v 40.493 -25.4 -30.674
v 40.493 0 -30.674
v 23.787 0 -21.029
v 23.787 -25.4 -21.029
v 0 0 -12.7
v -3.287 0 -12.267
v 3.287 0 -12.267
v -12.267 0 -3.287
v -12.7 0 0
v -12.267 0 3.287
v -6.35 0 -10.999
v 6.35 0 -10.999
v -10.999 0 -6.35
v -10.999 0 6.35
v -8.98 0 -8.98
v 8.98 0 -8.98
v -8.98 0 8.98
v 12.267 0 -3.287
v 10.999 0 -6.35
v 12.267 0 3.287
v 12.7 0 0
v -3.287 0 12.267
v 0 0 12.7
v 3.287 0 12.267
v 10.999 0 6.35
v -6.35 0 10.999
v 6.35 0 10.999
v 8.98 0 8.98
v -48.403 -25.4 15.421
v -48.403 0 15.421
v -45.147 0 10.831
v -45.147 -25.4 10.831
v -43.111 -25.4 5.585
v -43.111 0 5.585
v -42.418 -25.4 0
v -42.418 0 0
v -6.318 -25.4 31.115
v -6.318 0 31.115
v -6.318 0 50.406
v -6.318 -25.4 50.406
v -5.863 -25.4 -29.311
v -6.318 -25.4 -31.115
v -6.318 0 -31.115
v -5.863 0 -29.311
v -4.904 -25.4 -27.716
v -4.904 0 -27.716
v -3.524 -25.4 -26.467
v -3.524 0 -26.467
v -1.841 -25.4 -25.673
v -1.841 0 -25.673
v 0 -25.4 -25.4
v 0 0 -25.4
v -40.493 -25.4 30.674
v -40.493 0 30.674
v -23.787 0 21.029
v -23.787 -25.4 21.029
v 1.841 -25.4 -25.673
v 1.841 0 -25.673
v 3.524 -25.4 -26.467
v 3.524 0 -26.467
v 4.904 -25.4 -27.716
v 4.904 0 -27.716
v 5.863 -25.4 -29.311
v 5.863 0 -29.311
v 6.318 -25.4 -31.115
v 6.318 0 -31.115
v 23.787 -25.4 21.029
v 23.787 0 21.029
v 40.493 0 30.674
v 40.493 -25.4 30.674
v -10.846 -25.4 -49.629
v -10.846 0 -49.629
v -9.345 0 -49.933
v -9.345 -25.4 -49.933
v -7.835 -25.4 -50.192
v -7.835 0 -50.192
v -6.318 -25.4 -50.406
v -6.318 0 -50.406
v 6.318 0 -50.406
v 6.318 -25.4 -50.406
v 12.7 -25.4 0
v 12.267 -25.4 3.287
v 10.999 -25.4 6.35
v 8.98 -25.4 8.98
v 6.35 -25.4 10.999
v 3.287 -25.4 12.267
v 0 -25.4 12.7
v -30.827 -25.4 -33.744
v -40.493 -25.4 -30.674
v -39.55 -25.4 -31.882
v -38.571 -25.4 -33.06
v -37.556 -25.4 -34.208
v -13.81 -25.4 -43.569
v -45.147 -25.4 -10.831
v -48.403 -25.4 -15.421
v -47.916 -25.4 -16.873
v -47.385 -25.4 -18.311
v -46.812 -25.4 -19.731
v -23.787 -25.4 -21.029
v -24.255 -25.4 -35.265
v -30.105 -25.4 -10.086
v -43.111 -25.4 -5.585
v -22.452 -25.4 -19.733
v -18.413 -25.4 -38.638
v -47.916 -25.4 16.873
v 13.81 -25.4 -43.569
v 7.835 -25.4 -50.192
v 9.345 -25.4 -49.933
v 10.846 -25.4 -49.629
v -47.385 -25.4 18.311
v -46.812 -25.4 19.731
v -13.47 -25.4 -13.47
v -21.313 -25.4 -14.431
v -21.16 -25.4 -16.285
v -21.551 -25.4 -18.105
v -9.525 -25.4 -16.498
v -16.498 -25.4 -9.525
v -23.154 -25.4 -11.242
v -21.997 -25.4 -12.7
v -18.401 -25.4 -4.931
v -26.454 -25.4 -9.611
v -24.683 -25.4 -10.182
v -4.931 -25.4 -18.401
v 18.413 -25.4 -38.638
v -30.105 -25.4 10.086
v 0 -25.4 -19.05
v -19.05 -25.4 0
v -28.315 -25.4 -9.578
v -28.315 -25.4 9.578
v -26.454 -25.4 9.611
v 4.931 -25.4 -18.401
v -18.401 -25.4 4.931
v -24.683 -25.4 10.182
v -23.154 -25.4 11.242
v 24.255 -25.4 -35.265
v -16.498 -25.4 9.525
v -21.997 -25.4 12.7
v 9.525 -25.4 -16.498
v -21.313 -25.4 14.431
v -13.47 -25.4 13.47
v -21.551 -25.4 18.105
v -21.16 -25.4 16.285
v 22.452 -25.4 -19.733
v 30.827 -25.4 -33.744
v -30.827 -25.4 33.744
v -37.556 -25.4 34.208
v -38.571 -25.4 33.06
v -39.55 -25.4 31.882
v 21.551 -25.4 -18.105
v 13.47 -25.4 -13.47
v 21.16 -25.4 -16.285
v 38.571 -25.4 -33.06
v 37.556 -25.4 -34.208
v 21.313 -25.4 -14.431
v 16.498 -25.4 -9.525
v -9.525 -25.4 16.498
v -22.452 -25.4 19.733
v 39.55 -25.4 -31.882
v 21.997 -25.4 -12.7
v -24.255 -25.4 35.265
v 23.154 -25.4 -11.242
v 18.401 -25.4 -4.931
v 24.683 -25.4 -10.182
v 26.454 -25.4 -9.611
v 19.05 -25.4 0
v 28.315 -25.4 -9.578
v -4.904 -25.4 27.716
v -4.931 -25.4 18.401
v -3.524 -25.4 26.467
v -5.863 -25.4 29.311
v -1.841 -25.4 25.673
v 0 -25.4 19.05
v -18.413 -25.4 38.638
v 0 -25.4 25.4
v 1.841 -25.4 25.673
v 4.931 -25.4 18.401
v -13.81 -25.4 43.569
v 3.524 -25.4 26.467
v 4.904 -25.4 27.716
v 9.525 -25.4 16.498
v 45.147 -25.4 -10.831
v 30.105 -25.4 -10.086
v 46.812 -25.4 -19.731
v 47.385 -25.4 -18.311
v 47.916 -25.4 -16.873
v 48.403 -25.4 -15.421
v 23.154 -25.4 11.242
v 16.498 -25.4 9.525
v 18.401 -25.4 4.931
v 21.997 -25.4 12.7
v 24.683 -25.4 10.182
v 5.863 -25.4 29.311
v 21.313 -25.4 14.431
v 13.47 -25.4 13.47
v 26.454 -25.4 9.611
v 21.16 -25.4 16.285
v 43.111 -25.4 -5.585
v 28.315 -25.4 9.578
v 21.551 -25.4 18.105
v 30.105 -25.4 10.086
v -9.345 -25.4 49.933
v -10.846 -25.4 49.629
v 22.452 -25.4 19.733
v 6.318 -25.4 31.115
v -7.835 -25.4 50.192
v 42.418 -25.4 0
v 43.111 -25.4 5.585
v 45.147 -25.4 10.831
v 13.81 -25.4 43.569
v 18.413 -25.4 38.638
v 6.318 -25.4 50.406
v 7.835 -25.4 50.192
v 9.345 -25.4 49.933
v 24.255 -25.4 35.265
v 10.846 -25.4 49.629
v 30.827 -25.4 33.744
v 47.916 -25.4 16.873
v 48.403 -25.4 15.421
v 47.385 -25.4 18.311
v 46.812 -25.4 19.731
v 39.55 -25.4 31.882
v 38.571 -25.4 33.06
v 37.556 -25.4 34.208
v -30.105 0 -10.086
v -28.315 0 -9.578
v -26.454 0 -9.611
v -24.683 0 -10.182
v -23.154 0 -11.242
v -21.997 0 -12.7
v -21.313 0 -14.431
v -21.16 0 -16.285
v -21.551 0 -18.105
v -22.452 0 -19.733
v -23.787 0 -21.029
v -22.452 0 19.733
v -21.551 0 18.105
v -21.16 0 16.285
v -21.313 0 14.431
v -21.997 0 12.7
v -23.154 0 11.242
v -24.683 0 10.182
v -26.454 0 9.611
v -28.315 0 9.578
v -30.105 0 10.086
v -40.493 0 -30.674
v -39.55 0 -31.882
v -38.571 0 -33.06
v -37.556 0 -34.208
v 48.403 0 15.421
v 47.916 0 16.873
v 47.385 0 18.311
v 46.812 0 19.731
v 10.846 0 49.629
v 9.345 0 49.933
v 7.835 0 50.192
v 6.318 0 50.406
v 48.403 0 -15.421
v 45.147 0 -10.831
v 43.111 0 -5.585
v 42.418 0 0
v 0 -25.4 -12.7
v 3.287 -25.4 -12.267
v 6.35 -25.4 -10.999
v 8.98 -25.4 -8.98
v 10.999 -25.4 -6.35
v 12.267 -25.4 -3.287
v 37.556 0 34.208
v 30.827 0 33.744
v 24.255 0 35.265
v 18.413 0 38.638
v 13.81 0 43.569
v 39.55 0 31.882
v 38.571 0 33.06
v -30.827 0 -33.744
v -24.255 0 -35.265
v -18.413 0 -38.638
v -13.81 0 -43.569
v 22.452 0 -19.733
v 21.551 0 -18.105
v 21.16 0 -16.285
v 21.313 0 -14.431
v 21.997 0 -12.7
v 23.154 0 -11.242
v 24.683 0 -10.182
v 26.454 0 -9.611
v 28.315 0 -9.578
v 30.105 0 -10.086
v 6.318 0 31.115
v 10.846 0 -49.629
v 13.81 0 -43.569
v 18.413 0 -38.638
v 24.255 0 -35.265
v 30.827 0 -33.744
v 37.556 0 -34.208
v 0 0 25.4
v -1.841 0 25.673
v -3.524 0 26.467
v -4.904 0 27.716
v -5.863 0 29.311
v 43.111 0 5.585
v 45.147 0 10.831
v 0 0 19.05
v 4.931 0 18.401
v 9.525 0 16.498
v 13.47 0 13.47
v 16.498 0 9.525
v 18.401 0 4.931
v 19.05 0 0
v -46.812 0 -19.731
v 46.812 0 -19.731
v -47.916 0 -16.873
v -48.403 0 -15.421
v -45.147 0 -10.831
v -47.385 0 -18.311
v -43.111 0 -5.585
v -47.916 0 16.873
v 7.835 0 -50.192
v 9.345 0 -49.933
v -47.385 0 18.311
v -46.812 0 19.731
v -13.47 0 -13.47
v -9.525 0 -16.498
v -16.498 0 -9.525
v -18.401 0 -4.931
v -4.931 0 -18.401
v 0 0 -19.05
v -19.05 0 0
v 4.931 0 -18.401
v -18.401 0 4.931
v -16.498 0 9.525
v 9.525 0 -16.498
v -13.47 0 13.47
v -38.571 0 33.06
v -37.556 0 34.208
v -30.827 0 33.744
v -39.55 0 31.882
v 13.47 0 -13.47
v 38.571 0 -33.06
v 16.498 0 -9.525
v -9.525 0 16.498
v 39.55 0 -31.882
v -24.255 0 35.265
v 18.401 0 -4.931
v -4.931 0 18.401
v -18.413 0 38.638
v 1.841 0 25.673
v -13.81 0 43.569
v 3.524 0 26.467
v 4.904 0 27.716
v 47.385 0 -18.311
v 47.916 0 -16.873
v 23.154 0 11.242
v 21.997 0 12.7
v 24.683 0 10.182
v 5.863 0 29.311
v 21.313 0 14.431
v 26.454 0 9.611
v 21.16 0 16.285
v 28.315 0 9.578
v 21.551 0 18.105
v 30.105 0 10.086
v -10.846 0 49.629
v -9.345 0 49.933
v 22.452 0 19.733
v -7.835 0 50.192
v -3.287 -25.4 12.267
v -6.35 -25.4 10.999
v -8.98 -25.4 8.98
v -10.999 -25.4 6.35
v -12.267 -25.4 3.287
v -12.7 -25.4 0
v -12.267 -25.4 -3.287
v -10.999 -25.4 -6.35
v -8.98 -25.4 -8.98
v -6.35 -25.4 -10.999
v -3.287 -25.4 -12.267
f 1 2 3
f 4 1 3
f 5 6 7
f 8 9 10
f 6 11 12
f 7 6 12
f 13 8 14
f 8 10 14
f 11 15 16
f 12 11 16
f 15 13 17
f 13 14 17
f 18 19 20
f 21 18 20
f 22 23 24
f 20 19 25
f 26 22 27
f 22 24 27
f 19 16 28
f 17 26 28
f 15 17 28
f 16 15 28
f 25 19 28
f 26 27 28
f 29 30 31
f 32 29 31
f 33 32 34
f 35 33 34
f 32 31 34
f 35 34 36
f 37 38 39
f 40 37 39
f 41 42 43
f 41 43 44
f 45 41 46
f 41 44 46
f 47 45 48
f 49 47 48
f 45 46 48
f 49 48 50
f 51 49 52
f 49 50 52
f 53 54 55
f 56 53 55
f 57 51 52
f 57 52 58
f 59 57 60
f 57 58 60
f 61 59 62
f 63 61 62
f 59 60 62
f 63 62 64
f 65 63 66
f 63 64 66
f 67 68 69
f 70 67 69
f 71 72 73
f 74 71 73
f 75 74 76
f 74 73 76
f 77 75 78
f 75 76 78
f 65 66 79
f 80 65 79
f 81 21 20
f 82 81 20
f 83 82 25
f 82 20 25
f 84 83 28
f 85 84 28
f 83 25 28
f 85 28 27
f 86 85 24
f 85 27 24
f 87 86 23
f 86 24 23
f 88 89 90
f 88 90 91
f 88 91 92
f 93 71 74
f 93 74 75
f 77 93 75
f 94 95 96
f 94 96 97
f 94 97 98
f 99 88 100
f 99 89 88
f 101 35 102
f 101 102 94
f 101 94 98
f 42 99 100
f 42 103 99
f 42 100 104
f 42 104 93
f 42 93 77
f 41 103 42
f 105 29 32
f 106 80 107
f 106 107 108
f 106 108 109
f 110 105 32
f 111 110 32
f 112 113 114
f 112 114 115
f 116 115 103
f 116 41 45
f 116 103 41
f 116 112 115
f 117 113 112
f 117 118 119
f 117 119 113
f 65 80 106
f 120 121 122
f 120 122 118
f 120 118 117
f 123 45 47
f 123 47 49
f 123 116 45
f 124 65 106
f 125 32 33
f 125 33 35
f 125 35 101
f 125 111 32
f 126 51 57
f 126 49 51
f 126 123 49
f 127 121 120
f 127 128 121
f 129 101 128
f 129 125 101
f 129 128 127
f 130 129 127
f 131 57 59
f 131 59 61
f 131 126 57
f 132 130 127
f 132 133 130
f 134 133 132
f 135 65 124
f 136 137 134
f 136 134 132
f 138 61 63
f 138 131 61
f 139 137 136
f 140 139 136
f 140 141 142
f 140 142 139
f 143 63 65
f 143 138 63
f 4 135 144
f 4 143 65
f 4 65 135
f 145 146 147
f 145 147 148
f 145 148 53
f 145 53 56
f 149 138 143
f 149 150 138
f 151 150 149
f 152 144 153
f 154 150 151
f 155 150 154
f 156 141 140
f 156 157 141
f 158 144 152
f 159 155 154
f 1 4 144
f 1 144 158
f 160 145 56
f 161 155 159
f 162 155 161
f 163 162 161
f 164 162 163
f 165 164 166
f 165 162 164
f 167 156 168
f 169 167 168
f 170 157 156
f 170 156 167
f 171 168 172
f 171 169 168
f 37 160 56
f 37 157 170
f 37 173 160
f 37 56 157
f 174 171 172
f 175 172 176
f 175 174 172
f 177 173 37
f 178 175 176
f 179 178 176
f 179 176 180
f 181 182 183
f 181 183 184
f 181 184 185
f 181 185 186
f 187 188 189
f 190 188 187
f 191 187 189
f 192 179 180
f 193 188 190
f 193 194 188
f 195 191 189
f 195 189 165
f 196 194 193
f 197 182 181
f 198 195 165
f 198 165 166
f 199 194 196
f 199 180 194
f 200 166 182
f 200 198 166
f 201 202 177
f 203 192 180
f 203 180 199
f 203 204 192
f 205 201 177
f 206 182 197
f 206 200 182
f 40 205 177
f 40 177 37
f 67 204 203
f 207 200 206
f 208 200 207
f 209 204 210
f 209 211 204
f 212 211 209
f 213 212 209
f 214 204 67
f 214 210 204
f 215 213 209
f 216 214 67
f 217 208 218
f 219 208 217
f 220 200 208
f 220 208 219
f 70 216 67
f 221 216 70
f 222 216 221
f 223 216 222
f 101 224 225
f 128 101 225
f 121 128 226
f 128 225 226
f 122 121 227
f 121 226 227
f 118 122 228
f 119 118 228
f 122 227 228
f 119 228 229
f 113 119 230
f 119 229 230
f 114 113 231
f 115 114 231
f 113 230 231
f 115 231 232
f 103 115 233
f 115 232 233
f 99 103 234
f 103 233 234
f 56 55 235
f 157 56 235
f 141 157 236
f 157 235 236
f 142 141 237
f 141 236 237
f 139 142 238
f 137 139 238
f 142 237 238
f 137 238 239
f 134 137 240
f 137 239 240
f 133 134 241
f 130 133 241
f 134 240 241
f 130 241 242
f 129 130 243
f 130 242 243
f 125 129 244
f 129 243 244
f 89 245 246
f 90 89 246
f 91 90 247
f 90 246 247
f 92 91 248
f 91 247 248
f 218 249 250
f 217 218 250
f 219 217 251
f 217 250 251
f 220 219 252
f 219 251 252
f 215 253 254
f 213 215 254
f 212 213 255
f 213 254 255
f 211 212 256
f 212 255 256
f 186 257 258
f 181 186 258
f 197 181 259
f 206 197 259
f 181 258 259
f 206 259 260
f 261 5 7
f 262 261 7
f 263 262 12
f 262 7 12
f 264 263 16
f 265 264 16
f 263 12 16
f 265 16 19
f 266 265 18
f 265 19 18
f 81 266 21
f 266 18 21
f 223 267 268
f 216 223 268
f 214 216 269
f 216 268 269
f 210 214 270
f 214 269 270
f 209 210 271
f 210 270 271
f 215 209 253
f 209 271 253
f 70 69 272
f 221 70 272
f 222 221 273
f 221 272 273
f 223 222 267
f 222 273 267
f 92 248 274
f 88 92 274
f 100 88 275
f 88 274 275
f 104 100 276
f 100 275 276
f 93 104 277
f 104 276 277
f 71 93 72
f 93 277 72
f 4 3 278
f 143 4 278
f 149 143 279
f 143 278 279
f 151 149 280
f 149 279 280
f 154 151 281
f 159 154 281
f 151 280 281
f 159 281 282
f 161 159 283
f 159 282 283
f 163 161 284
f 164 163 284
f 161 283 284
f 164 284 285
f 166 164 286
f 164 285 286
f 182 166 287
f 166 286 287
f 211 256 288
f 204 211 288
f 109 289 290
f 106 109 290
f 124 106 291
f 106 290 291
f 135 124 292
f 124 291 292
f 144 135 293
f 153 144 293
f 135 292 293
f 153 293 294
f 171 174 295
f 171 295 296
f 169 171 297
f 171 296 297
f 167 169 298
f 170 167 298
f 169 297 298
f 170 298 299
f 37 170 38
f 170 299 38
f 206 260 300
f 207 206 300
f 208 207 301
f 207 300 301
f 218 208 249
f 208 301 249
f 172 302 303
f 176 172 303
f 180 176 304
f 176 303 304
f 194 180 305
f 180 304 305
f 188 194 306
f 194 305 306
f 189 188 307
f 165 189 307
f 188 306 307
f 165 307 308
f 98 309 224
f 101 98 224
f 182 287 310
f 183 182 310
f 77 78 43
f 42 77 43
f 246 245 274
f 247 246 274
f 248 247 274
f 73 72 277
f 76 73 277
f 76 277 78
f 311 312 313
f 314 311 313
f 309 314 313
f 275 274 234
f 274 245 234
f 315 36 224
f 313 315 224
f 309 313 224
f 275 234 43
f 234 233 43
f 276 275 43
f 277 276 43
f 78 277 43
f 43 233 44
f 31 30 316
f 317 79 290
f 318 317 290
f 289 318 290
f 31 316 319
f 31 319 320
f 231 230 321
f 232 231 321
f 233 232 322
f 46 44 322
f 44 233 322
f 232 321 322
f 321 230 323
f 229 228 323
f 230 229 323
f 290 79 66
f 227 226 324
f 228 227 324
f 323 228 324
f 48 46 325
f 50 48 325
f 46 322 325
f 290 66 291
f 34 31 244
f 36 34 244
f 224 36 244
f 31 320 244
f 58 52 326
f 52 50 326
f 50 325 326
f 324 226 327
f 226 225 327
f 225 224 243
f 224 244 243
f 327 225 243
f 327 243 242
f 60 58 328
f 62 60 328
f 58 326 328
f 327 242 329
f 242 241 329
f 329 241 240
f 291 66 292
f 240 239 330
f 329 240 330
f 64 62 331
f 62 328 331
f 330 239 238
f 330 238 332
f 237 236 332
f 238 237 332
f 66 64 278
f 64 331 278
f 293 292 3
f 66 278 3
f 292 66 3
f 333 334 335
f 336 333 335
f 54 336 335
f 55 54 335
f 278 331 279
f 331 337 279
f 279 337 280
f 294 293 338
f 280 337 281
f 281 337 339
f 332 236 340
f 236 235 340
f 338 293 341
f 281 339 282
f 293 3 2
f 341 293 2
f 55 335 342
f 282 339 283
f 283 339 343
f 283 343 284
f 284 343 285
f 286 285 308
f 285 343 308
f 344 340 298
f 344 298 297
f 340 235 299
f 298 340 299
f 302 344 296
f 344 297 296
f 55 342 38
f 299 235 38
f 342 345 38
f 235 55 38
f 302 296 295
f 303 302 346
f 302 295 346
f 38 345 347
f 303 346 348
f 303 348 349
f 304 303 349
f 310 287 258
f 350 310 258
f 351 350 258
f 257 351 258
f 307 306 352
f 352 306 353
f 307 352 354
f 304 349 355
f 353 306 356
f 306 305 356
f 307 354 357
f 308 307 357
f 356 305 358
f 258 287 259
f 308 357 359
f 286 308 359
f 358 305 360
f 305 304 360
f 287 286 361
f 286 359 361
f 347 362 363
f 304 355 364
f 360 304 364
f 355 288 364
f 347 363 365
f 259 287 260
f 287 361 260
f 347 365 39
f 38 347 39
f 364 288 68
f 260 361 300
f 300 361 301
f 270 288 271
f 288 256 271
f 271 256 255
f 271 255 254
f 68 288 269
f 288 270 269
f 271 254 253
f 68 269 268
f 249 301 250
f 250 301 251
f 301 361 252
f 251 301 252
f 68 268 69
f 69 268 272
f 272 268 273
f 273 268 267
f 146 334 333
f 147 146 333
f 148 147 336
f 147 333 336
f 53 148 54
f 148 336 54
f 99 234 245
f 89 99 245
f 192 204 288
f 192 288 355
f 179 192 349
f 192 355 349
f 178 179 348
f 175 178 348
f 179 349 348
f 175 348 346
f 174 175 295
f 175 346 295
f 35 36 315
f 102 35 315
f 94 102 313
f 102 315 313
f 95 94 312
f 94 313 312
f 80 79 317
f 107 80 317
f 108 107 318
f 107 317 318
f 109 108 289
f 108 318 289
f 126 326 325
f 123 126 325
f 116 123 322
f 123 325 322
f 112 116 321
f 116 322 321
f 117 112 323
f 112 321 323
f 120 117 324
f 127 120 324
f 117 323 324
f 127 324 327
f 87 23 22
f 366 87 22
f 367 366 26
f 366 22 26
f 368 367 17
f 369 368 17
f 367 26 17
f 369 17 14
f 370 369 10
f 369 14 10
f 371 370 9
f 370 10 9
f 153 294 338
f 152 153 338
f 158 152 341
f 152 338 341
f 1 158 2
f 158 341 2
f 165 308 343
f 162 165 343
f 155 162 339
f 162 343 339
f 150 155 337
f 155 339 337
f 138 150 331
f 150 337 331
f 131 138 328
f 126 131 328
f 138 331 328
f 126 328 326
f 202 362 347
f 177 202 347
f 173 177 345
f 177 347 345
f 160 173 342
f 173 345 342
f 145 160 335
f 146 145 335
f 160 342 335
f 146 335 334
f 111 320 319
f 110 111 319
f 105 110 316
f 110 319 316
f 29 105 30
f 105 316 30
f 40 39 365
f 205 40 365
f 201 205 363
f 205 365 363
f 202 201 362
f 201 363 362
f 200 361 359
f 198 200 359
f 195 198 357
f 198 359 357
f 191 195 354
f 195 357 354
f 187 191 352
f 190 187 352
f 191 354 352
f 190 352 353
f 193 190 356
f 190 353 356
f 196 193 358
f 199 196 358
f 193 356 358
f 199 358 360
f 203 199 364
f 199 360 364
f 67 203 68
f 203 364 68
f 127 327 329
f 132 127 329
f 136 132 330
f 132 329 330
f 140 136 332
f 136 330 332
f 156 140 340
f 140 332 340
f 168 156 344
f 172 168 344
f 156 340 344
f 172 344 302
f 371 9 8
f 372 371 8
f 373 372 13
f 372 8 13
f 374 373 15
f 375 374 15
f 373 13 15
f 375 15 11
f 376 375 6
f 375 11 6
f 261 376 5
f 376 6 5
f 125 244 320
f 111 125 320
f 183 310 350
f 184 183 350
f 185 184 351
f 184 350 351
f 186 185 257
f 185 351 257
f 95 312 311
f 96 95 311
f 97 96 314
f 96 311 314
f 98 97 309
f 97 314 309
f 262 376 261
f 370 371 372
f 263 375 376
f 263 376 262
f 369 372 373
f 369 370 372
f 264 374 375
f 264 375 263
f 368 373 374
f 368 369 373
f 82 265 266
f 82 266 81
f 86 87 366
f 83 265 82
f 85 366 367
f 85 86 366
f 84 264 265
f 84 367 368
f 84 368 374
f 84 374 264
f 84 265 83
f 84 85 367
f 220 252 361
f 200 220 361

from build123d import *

# Parameters (mm, degrees)
F1_DEPTH = 25.4
F2_DEPTH = 25.4


with BuildPart() as f1:
    # F0 (on Front) → F1 (new body)
    with BuildSketch(Plane.XZ):
        with BuildLine():
            Line((42.418, 0), (19.05, 0))
            ThreePointArc((19.05, 0), (13.470384, -13.470384), (0, -19.05))
            Line((0, -19.05), (0, -25.4))
            ThreePointArc((0, -25.4), (4.259709, -27.040714), (6.31817, -31.115))
            Line((6.31817, -31.115), (6.31817, -50.405562))
            ThreePointArc((6.31817, -50.405562), (8.591082, -50.068286), (10.846417, -49.628573))
            ThreePointArc((10.846417, -49.628573), (21.209, -36.735066), (37.556396, -34.207559))
            ThreePointArc((37.556396, -34.207559), (39.064867, -32.474238), (40.493412, -30.674477))
            Line((40.493412, -30.674477), (23.787295, -21.029196))
            ThreePointArc((23.787295, -21.029196), (21.997045, -12.7), (30.105466, -10.085804))
            Line((30.105466, -10.085804), (46.811583, -19.731085))
            ThreePointArc((46.811583, -19.731085), (47.655949, -17.594048), (48.402813, -15.421014))
            ThreePointArc((48.402813, -15.421014), (43.966661, -8.270817), (42.418, 0))
        make_face()
        with BuildLine():
            ThreePointArc((0, 19.05), (13.470384, 13.470384), (19.05, 0))
            Line((19.05, 0), (42.418, 0))
            ThreePointArc((42.418, 0), (43.966661, 8.270817), (48.402813, 15.421014))
            ThreePointArc((48.402813, 15.421014), (47.655949, 17.594048), (46.811583, 19.731085))
            Line((46.811583, 19.731085), (30.105466, 10.085804))
            ThreePointArc((30.105466, 10.085804), (21.997045, 12.7), (23.787295, 21.029196))
            Line((23.787295, 21.029196), (40.493412, 30.674477))
            ThreePointArc((40.493412, 30.674477), (39.064867, 32.474238), (37.556396, 34.207559))
            ThreePointArc((37.556396, 34.207559), (21.209, 36.735066), (10.846417, 49.628573))
            ThreePointArc((10.846417, 49.628573), (8.591082, 50.068286), (6.31817, 50.405562))
            Line((6.31817, 50.405562), (6.31817, 31.115))
            ThreePointArc((6.31817, 31.115), (4.259709, 27.040714), (0, 25.4))
            Line((0, 25.4), (0, 19.05))
        make_face()
        with BuildLine():
            ThreePointArc((-19.05, 0), (-13.470384, 13.470384), (0, 19.05))
            Line((0, 19.05), (0, 25.4))
            ThreePointArc((0, 25.4), (-4.259709, 27.040714), (-6.31817, 31.115))
            Line((-6.31817, 31.115), (-6.31817, 50.405562))
            ThreePointArc((-6.31817, 50.405562), (-8.591082, 50.068286), (-10.846417, 49.628573))
            ThreePointArc((-10.846417, 49.628573), (-21.209, 36.735066), (-37.556396, 34.207559))
            ThreePointArc((-37.556396, 34.207559), (-39.064867, 32.474238), (-40.493412, 30.674477))
            Line((-40.493412, 30.674477), (-23.787295, 21.029196))
            ThreePointArc((-23.787295, 21.029196), (-21.997045, 12.7), (-30.105466, 10.085804))
            Line((-30.105466, 10.085804), (-46.811583, 19.731085))
            ThreePointArc((-46.811583, 19.731085), (-47.655949, 17.594048), (-48.402813, 15.421014))
            ThreePointArc((-48.402813, 15.421014), (-43.966661, 8.270817), (-42.418, 0))
            Line((-42.418, 0), (-19.05, 0))
        make_face()
        with BuildLine():
            Line((0, -25.4), (0, -19.05))
            ThreePointArc((0, -19.05), (-13.470384, -13.470384), (-19.05, 0))
            Line((-19.05, 0), (-42.418, 0))
            ThreePointArc((-42.418, 0), (-43.966661, -8.270817), (-48.402813, -15.421014))
            ThreePointArc((-48.402813, -15.421014), (-47.655949, -17.594048), (-46.811583, -19.731085))
            Line((-46.811583, -19.731085), (-30.105466, -10.085804))
            ThreePointArc((-30.105466, -10.085804), (-21.997045, -12.7), (-23.787295, -21.029196))
            Line((-23.787295, -21.029196), (-40.493412, -30.674477))
            ThreePointArc((-40.493412, -30.674477), (-39.064867, -32.474238), (-37.556396, -34.207559))
            ThreePointArc((-37.556396, -34.207559), (-21.209, -36.735066), (-10.846417, -49.628573))
            ThreePointArc((-10.846417, -49.628573), (-8.591082, -50.068286), (-6.31817, -50.405562))
            Line((-6.31817, -50.405562), (-6.31817, -31.115))
            ThreePointArc((-6.31817, -31.115), (-4.259709, -27.040714), (0, -25.4))
        make_face()
    extrude(amount=F1_DEPTH)


with BuildPart() as f2:
    # F0 (on Front) → F2 (new body)
    with BuildSketch(Plane.XZ):
        with BuildLine():
            ThreePointArc((0, -12.7), (8.980256, -8.980256), (12.7, 0))
            Line((12.7, 0), (0, 0))
            Line((0, 0), (0, -12.7))
        make_face()
        with BuildLine():
            Line((0, 0), (12.7, 0))
            ThreePointArc((12.7, 0), (8.980256, 8.980256), (0, 12.7))
            Line((0, 12.7), (0, 0))
        make_face()
        with BuildLine():
            Line((0, 0), (0, 12.7))
            ThreePointArc((0, 12.7), (-8.980256, 8.980256), (-12.7, 0))
            Line((-12.7, 0), (0, 0))
        make_face()
        with BuildLine():
            ThreePointArc((-12.7, 0), (-8.980256, -8.980256), (0, -12.7))
            Line((0, -12.7), (0, 0))
            Line((0, 0), (-12.7, 0))
        make_face()
    extrude(amount=F2_DEPTH)


solid = Compound([f1.part, f2.part])
